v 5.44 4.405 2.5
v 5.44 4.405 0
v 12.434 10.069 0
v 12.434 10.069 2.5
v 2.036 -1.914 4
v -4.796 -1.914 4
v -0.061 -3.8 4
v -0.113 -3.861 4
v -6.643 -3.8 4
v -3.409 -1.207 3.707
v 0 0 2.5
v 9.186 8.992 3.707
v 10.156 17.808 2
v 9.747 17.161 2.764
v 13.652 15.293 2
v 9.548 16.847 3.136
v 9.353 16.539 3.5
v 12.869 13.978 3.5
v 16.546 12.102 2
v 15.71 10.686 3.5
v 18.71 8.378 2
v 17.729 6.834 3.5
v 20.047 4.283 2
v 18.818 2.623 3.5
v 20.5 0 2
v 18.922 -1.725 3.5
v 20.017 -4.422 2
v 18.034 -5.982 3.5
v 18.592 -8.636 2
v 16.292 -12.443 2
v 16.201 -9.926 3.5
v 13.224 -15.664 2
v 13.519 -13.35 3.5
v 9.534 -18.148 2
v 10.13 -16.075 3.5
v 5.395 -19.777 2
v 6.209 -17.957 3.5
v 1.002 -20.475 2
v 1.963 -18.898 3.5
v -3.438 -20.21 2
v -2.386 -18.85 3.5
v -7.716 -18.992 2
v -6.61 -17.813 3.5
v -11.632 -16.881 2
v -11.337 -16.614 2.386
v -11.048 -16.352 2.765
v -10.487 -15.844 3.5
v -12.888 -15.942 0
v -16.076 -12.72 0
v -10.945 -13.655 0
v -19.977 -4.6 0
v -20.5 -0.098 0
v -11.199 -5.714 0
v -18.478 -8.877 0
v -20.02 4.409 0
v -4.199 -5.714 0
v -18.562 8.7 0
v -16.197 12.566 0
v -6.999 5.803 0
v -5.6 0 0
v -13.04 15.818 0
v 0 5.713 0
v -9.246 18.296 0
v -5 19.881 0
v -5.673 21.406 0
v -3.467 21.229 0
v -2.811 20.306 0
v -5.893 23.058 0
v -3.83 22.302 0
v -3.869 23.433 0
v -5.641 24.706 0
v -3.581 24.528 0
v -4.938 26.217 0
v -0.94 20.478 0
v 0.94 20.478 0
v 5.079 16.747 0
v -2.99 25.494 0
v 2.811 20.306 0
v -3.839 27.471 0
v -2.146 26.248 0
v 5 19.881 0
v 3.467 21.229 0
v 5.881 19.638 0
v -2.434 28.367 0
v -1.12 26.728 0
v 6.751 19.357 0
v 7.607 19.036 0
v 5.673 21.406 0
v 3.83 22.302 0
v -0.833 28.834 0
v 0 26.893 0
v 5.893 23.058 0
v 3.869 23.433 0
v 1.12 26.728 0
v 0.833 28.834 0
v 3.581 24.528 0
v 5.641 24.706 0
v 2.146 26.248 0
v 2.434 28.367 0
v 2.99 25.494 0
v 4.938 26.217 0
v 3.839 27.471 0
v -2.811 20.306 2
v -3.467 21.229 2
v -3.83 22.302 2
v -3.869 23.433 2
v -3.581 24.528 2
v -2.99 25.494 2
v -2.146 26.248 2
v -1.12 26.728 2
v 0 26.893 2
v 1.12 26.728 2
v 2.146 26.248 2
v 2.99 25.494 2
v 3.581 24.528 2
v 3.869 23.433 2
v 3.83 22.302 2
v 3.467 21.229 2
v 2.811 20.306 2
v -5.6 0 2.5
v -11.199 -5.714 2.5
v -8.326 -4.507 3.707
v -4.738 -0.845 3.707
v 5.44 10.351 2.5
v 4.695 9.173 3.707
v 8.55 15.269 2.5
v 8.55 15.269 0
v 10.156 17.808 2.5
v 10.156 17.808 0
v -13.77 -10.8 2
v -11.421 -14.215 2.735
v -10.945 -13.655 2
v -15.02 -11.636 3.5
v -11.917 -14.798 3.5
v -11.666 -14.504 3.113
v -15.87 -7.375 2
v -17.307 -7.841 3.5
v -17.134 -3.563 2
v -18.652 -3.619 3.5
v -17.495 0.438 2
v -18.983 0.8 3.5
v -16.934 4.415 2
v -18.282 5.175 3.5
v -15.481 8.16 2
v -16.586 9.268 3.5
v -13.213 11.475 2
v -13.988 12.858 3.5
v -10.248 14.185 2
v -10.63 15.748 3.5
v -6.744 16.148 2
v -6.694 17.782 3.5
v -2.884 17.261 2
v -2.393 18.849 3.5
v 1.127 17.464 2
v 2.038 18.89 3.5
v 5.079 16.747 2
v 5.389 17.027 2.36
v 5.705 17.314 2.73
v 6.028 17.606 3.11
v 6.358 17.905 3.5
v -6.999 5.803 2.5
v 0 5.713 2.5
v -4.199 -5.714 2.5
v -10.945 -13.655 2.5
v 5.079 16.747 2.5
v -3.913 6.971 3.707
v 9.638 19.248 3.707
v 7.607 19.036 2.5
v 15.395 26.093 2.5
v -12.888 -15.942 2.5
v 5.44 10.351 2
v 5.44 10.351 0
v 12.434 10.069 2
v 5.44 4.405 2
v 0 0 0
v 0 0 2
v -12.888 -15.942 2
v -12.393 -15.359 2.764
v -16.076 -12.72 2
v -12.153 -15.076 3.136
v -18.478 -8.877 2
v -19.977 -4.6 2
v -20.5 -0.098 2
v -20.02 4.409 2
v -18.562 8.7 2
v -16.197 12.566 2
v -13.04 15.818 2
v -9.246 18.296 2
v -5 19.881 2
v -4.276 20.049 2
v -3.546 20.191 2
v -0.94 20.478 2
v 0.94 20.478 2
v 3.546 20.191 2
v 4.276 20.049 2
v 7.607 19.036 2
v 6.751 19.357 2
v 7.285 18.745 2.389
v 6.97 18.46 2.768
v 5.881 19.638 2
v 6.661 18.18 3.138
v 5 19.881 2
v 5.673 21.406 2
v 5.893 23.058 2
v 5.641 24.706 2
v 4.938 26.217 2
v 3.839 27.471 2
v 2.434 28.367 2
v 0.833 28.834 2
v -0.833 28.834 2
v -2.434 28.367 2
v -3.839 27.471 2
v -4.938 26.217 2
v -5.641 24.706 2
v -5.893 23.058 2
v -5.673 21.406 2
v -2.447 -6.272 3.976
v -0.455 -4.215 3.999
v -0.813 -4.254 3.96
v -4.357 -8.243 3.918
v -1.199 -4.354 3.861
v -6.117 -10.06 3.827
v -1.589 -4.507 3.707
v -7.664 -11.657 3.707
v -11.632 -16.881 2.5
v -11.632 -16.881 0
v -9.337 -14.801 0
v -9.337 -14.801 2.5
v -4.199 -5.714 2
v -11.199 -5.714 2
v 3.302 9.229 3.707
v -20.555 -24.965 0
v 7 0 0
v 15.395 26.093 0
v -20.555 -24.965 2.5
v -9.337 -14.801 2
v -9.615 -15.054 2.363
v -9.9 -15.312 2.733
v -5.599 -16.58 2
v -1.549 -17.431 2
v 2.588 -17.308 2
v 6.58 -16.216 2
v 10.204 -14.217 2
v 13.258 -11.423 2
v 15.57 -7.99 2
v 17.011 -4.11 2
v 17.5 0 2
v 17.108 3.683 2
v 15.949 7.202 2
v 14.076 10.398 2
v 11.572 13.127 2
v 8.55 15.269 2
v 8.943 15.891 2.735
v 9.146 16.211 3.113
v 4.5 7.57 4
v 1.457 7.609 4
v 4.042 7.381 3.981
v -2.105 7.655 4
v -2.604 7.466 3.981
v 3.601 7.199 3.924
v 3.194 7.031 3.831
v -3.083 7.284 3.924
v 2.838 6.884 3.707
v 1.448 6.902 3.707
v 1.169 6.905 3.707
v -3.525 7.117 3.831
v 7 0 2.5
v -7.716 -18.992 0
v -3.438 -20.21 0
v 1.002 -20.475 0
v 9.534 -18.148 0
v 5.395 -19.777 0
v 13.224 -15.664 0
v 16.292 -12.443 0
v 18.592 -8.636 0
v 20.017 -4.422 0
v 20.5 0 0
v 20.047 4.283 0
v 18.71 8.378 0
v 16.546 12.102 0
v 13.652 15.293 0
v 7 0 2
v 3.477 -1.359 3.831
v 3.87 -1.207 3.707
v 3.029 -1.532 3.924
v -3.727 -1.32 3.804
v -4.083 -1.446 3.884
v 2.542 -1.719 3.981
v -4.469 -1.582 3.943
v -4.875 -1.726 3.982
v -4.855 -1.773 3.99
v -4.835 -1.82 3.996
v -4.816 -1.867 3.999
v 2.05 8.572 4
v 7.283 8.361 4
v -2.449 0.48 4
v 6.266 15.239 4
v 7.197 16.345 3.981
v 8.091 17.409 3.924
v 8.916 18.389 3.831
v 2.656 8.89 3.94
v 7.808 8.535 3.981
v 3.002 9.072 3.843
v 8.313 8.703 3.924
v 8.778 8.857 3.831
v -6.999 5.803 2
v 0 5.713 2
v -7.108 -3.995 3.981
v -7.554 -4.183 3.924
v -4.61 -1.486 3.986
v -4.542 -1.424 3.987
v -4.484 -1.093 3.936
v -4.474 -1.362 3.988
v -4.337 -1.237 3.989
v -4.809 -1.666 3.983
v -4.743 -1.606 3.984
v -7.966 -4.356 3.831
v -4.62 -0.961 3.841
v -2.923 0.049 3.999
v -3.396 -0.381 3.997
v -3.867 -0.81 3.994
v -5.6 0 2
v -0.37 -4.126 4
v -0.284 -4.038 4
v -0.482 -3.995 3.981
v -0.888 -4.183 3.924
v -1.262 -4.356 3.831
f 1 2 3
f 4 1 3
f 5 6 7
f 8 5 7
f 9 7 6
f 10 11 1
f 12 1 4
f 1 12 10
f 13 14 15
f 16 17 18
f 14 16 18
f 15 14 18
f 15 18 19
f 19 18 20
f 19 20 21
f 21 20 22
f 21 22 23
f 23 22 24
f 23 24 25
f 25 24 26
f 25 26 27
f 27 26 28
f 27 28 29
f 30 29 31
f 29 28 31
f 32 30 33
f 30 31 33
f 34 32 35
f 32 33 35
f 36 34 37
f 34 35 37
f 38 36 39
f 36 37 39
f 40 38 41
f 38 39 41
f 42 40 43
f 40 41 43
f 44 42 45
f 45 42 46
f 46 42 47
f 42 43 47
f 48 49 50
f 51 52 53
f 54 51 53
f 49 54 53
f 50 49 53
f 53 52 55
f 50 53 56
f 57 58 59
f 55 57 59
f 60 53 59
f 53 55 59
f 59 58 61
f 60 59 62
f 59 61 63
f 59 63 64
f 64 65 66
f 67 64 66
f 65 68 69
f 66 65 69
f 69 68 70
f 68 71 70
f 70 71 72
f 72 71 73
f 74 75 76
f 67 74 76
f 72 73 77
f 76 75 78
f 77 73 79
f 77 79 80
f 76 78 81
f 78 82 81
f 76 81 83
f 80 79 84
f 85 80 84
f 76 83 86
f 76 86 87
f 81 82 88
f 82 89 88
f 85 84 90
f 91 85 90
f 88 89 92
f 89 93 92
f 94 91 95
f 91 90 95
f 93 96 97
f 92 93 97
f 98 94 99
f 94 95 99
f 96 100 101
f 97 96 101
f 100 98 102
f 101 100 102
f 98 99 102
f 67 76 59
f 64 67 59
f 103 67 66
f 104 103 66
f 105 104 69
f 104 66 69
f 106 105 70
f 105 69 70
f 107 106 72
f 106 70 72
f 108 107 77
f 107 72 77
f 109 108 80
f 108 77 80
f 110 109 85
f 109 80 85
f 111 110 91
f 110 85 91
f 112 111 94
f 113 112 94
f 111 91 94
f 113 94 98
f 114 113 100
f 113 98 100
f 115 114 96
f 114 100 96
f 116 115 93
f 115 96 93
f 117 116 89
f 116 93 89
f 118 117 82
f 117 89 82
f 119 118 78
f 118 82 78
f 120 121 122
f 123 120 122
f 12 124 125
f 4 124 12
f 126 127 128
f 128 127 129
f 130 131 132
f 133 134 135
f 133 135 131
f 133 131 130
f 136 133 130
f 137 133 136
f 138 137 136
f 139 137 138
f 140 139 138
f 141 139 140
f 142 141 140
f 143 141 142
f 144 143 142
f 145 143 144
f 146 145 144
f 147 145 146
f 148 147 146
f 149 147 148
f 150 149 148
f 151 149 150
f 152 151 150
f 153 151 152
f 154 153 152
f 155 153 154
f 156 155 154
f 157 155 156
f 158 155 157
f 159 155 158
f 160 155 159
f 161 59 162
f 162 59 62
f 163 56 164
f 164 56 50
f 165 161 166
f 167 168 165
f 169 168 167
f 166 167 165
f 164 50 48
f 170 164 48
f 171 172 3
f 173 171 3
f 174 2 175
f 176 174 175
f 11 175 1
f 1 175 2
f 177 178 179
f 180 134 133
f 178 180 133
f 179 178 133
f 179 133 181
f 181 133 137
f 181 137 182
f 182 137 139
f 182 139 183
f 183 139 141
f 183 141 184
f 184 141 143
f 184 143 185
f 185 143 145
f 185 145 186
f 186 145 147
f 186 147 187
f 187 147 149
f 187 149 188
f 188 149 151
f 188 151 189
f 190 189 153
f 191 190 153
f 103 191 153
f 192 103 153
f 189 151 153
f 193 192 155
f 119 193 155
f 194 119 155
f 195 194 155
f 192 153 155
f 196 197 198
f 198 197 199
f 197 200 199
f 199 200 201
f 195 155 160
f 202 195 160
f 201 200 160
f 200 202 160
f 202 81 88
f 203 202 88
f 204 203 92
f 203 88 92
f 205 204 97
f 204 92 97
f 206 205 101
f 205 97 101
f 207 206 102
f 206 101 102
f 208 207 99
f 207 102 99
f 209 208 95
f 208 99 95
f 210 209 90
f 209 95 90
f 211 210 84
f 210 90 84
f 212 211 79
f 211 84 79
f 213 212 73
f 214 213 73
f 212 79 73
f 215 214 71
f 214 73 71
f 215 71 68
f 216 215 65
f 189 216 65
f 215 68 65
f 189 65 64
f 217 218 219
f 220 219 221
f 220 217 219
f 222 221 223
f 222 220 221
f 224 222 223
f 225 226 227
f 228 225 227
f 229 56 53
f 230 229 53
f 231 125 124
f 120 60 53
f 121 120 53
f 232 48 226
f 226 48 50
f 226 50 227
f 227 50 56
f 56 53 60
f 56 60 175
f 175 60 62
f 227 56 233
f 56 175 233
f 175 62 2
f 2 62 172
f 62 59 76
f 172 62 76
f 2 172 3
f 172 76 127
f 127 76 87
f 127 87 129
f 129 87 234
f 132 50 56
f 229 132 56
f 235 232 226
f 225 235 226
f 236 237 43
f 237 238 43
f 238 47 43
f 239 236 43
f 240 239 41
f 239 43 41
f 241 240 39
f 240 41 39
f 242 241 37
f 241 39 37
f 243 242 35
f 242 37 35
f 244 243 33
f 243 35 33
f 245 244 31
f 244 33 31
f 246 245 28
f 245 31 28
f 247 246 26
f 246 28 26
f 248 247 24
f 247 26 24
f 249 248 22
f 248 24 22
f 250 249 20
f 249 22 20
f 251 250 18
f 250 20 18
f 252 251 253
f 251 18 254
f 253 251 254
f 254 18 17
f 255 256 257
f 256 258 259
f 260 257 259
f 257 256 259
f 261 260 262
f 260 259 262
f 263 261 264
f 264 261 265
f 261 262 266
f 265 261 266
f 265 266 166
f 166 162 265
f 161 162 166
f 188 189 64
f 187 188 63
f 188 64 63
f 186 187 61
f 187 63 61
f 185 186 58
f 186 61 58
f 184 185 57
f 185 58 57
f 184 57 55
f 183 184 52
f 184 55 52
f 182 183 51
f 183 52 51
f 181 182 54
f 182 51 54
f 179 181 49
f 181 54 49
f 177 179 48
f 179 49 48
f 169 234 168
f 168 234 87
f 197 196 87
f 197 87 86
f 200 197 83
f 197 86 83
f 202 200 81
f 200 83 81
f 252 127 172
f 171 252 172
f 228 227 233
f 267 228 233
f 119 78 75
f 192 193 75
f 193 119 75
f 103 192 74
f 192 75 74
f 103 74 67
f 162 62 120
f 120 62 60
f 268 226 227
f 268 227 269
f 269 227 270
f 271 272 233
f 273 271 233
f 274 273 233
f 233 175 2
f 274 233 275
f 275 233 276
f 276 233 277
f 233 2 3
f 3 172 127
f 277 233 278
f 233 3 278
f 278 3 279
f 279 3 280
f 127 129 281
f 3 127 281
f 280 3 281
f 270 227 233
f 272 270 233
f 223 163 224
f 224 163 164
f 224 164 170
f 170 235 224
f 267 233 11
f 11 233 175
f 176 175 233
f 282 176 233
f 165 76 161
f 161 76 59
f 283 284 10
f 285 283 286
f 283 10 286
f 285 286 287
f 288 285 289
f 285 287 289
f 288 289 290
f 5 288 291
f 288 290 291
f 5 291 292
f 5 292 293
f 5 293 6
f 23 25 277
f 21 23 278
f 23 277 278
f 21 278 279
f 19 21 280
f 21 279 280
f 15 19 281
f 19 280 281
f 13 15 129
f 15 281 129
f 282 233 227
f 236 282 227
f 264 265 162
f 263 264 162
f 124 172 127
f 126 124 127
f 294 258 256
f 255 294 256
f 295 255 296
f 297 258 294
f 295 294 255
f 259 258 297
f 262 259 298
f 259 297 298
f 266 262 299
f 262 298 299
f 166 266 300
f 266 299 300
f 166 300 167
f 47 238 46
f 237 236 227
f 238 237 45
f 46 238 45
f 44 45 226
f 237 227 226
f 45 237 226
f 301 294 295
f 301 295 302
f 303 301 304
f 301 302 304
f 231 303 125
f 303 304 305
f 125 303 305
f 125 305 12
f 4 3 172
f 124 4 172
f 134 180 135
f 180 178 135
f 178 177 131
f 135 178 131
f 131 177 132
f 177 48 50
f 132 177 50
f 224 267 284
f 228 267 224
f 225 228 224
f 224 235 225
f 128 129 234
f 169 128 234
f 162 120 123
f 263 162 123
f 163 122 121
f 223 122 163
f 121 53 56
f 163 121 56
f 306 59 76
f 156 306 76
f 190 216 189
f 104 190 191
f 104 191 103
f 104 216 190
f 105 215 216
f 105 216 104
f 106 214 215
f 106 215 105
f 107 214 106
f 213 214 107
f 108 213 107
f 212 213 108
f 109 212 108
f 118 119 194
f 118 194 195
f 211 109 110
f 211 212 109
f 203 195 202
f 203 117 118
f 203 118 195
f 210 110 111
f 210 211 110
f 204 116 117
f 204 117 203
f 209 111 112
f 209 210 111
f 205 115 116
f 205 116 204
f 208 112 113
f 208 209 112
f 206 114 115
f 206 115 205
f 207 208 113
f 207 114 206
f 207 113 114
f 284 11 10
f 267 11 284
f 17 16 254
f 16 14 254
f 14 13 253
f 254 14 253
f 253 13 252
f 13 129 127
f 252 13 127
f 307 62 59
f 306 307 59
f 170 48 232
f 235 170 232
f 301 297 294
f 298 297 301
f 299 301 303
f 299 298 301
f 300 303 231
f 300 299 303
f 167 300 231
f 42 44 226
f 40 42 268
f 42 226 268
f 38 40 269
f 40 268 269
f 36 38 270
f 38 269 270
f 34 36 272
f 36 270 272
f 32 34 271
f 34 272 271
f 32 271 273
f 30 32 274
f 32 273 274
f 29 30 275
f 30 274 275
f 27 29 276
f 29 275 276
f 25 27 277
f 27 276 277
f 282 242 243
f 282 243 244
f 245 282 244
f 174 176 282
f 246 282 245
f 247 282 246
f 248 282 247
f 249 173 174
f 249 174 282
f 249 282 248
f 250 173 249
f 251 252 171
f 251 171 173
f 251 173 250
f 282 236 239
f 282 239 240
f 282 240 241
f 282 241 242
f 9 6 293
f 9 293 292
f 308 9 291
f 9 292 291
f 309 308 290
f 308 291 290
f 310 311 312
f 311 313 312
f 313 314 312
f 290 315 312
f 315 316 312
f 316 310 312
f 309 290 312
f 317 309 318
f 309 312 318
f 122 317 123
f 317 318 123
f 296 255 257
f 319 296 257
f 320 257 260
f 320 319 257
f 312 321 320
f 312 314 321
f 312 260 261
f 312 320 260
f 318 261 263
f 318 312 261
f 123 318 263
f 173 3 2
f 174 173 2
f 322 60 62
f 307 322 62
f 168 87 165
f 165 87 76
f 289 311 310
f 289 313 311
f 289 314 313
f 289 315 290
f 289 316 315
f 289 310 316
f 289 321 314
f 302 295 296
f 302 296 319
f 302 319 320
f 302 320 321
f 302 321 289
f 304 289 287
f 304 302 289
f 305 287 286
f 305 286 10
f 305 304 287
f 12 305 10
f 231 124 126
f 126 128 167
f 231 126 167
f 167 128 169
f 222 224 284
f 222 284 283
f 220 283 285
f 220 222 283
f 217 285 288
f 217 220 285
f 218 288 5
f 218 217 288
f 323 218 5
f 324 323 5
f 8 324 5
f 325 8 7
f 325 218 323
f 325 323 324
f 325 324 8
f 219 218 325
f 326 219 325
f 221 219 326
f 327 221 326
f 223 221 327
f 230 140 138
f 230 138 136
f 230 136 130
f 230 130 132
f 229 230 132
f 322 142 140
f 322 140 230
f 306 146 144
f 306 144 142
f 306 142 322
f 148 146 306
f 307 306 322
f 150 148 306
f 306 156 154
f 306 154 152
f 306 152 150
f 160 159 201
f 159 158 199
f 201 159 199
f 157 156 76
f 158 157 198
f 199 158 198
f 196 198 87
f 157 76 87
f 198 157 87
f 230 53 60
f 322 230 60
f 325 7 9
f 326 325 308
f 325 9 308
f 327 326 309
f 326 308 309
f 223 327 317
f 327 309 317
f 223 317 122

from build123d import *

# Parameters (mm, degrees)
F1_DEPTH      = 4
F2_DEPTH      = 2
F3_DEPTH      = 4
F4_T4_ANGLE   = 191.8794829406
F4_T7_ANGLE   = 191.6152635237
F4_2_T4_ANGLE = 216.7313007881
F4_2_T7_ANGLE = 213.6722162464
F5_T1_DEPTH   = 44.8975853427
F5_T6_DEPTH   = 12.4810064107
F5_T11_DEPTH  = 26.0985725575
F5_T16_DEPTH  = 12.442760274
F5_T21_DEPTH  = 28.0729631379
F5_T23_DEPTH  = 35.0265854945
F5_T28_DEPTH  = 12.5120201061
F5_T30_DEPTH  = 11.8575244819
F5_T35_DEPTH  = 13.9320278094
F5_T40_DEPTH  = 12.6150489639
F5_T45_DEPTH  = 38.8381685856
F6_T1_DEPTH   = 19.5328240955
F6_T3_DEPTH   = 5.6520455224
F6_T5_DEPTH   = 16.5312582393
F6_T7_DEPTH   = 5.740258782
F6_T9_DEPTH   = 5.4658400603
F6_T14_DEPTH  = 14.3536282373
F6_T19_DEPTH  = 7.6900173534
F6_T24_DEPTH  = 3.1100372333
F6_T29_DEPTH  = 12.5427572364
F6_T34_DEPTH  = 18.3278104704
F6_T39_DEPTH  = 9.4173142872
F6_T44_DEPTH  = 3.0038182041
F6_T49_DEPTH  = 11.742181059
F6_T55_DEPTH  = 14.3536282373
F6_T59_DEPTH  = 7.6900173534
F6_T66_DEPTH  = 12.5427572364
F6_T70_DEPTH  = 3.1100372333
F6_T77_DEPTH  = 9.4173142872
F6_T81_DEPTH  = 18.3278104704
F6_T88_DEPTH  = 11.742181059
F6_T92_DEPTH  = 3.0038182041
F7_DEPTH      = 2


# Not quite as in the source:
# - a fillet or chamfer that OpenCascade refuses, or shapes differently, is made with other operations: its cross-section is extruded or revolved along the edge and cut away or added


with BuildPart() as f1:
    # F0 (on Top) → F1 (new body)
    with BuildSketch(Plane.XY):
        with BuildLine():
            ThreePointArc((7.6067055324, 19.0364920861), (6.317476578, 19.5022944723), (5, 19.8808953521))
            ThreePointArc((5, 19.8808953521), (3.9112066982, 20.1234306758), (2.8108329276, 20.3063836823))
            ThreePointArc((2.8108329276, 20.3063836823), (0, 20.5), (-2.8108329276, 20.3063836823))
            ThreePointArc((-2.8108329276, 20.3063836823), (-3.9112066982, 20.1234306758), (-5, 19.8808953521))
            ThreePointArc((-5, 19.8808953521), (-20.0203567241, 4.4085504011), (-12.8882864218, -15.9418340573))
            Line((-12.8882864218, -15.9418340573), (-10.945178398, -13.6547819402))
            ThreePointArc((-10.945178398, -13.6547819402), (-15.4810745708, 8.1600447385), (5.0793558765, 16.7466457501))
            Line((5.0793558765, 16.7466457501), (7.6067055324, 19.0364920861))
        make_face()
    extrude(amount=F1_DEPTH)

    # F0 (on Top) → F2 (join)
    with BuildSketch(Plane.XY):
        with BuildLine():
            Line((-6.9994239003, 5.8029484458), (5.0793558765, 16.7466457501))
            ThreePointArc((5.0793558765, 16.7466457501), (-15.4810745708, 8.1600447385), (-10.945178398, -13.6547819402))
            Line((-10.945178398, -13.6547819402), (-4.1988336978, -5.7142857143))
            Line((-4.1988336978, -5.7142857143), (-11.1988336978, -5.7142857143))
            Line((-11.1988336978, -5.7142857143), (-5.6, 0))
            Line((-5.6, 0), (0, 5.7131427428))
            Line((0, 5.7131427428), (-6.9994239003, 5.8029484458))
        make_face()
    extrude(amount=F2_DEPTH)

    # F4: chamfer of 2 on 2 edges, made by hand


with BuildPart() as f1b:
    # F0 (on Top) → F1, piece 2 (new body)
    with BuildSketch(Plane.XY):
        with BuildLine():
            ThreePointArc((20.5, 0), (17.7262389076, 10.297109021), (10.1555654448, 17.807708738))
            Line((10.1555654448, 17.807708738), (8.5501270855, 15.2690971188))
            ThreePointArc((8.5501270855, 15.2690971188), (15.0976359738, 8.8493721812), (17.5, 0))
            ThreePointArc((17.5, 0), (8.4516512974, -15.3238242729), (-9.336524611, -14.8013279197))
            Line((-9.336524611, -14.8013279197), (-11.6315427767, -16.8806757162))
            ThreePointArc((-11.6315427767, -16.8806757162), (9.5342375961, -18.1479561786), (20.5, 0))
        make_face()
    extrude(amount=F1_DEPTH)

    # F0 (on Top) → F2, piece 2 (join)
    with BuildSketch(Plane.XY):
        with BuildLine():
            ThreePointArc((17.5, 0), (15.0976359738, 8.8493721812), (8.5501270855, 15.2690971188))
            Line((8.5501270855, 15.2690971188), (5.4400217302, 10.3512193653))
            Line((5.4400217302, 10.3512193653), (12.4343353833, 10.0691262568))
            Line((12.4343353833, 10.0691262568), (5.4400217302, 4.4052427373))
            Line((5.4400217302, 4.4052427373), (0, 0))
            Line((0, 0), (7, 0))
            Line((7, 0), (-9.336524611, -14.8013279197))
            ThreePointArc((-9.336524611, -14.8013279197), (8.4516512974, -15.3238242729), (17.5, 0))
        make_face()
    extrude(amount=F2_DEPTH)

    # F4#2: chamfer of 2 on 2 edges, made by hand


with BuildPart() as f3:
    # F0 (on Top) → F3 (new body)
    with BuildSketch(Plane.XY):
        with BuildLine():
            ThreePointArc((-11.6315427767, -16.8806757162), (-12.2688981533, -16.4232803698), (-12.8882864218, -15.9418340573))
            Line((-12.8882864218, -15.9418340573), (-20.5548353552, -24.9654172829))
            Line((-20.5548353552, -24.9654172829), (-11.6315427767, -16.8806757162))
        make_face()
        with BuildLine():
            Line((-10.945178398, -13.6547819402), (-12.8882864218, -15.9418340573))
            ThreePointArc((-12.8882864218, -15.9418340573), (-12.2688981533, -16.4232803698), (-11.6315427767, -16.8806757162))
            Line((-11.6315427767, -16.8806757162), (-9.336524611, -14.8013279197))
            ThreePointArc((-9.336524611, -14.8013279197), (-10.1570424415, -14.2507715174), (-10.945178398, -13.6547819402))
        make_face()
        with BuildLine():
            ThreePointArc((8.5501270855, 15.2690971188), (6.8546691344, 16.1016617483), (5.0793558765, 16.7466457501))
            Line((5.0793558765, 16.7466457501), (-6.9994239003, 5.8029484458))
            Line((-6.9994239003, 5.8029484458), (0, 5.7131427428))
            Line((0, 5.7131427428), (-5.6, 0))
            Line((-5.6, 0), (-11.1988336978, -5.7142857143))
            Line((-11.1988336978, -5.7142857143), (-4.1988336978, -5.7142857143))
            Line((-4.1988336978, -5.7142857143), (-10.945178398, -13.6547819402))
            ThreePointArc((-10.945178398, -13.6547819402), (-10.1570424415, -14.2507715174), (-9.336524611, -14.8013279197))
            Line((-9.336524611, -14.8013279197), (7, 0))
            Line((7, 0), (0, 0))
            Line((0, 0), (5.4400217302, 4.4052427373))
            Line((5.4400217302, 4.4052427373), (12.4343353833, 10.0691262568))
            Line((12.4343353833, 10.0691262568), (5.4400217302, 10.3512193653))
            Line((5.4400217302, 10.3512193653), (8.5501270855, 15.2690971188))
        make_face()
        with BuildLine():
            ThreePointArc((10.1555654448, 17.807708738), (8.9023617482, 18.4661299493), (7.6067055324, 19.0364920861))
            Line((7.6067055324, 19.0364920861), (5.0793558765, 16.7466457501))
            ThreePointArc((5.0793558765, 16.7466457501), (6.8546691344, 16.1016617483), (8.5501270855, 15.2690971188))
            Line((8.5501270855, 15.2690971188), (10.1555654448, 17.807708738))
        make_face()
        with BuildLine():
            Line((15.3954302851, 26.0932848794), (7.6067055324, 19.0364920861))
            ThreePointArc((7.6067055324, 19.0364920861), (8.9023617482, 18.4661299493), (10.1555654448, 17.807708738))
            Line((10.1555654448, 17.807708738), (15.3954302851, 26.0932848794))
        make_face()
    extrude(amount=F3_DEPTH)

    # F5: chamfer of 1.5 on 11 edges, made by hand

    # F5_s2 → F5_t1 (cut)
    with BuildSketch(Plane(origin=(-26.5692425202, -24.0724438327, 0), x_dir=(0, 0, 1), z_dir=(0.7410692771, 0.6714285714, 0))):
        Polygon((2.5, 4.7), (4, 3.2), (4, 4.7), align=None)
    extrude(amount=F5_T1_DEPTH, mode=Mode.SUBTRACT)


with BuildPart() as f4_tool2:
    # F4_s3 → F4_t4 (revolve)
    with BuildSketch(Plane(origin=(0, 0, 0), x_dir=(0, 0, 1), z_dir=(0.9281361418, -0.3722409198, 0))):
        Polygon((2, 17.5), (4, 19.5), (4, 17.5), align=None)
    revolve(axis=Axis((0, 0, 4), (0, 0, -1)), revolution_arc=F4_T4_ANGLE)

    split(bisect_by=Plane.XY.offset(2), keep=Keep.TOP)


with BuildPart() as f1_1:
    add(f1.part)

    # F4_t1: cut F4_tool2
    add(f4_tool2.part, mode=Mode.SUBTRACT)

    # F4_s6 → F4_t7 (revolve, cut)
    with BuildSketch(Plane(origin=(0, 0, 0), x_dir=(0, 0, 1), z_dir=(0.9095275389, -0.4156436646, 0))):
        Polygon((2, 20.5), (4, 18.5), (4, 20.5), align=None)
    revolve(axis=Axis((0, 0, 4), (0, 0, -1)), revolution_arc=F4_T7_ANGLE, mode=Mode.SUBTRACT)

    # F0 (on Top) → F7 (join)
    with BuildSketch(Plane.XY):
        with BuildLine():
            ThreePointArc((2.8108329276, 20.3063836823), (3.9112066982, 20.1234306758), (5, 19.8808953521))
            ThreePointArc((5, 19.8808953521), (0, 28.8931157977), (-5, 19.8808953521))
            ThreePointArc((-5, 19.8808953521), (-3.9112066982, 20.1234306758), (-2.8108329276, 20.3063836823))
            ThreePointArc((-2.8108329276, 20.3063836823), (0, 26.8931157977), (2.8108329276, 20.3063836823))
        make_face()
    extrude(amount=F7_DEPTH)


with BuildPart() as f4_2_tool2:
    # F4_2_s3 → F4_2_t4 (revolve)
    with BuildSketch(Plane(origin=(0, 0, 0), x_dir=(0, 0, 1), z_dir=(-0.6545969301, 0.7559780811, 0))):
        Polygon((2, -17.5), (4, -19.5), (4, -17.5), align=None)
    revolve(axis=Axis((0, 0, 4), (0, 0, 1)), revolution_arc=F4_2_T4_ANGLE)

    split(bisect_by=Plane.XY.offset(2), keep=Keep.TOP)


with BuildPart() as f1b_1:
    add(f1b.part)

    # F4_2_t1: cut F4_2_tool2
    add(f4_2_tool2.part, mode=Mode.SUBTRACT)

    # F4_2_s6 → F4_2_t7 (revolve, cut)
    with BuildSketch(Plane(origin=(0, 0, 0), x_dir=(0, 0, 1), z_dir=(-0.964575687, 0.2638062623, 0))):
        Polygon((2, 20.5), (4, 18.5), (4, 20.5), align=None)
    revolve(axis=Axis((0, 0, 4), (0, 0, -1)), revolution_arc=F4_2_T7_ANGLE, mode=Mode.SUBTRACT)


with BuildPart() as f5_tool4:
    # F5_s5 → F5_t6 (new body)
    with BuildSketch(Plane.YZ.offset(8.6234819288)):
        Polygon((0, 2.5), (-1.5, 4), (0, 4), align=None)
    extrude(amount=-F5_T6_DEPTH)

    split(bisect_by=Plane(origin=(0, 0, 0), x_dir=(0, 0, 1), z_dir=(0.629320391, -0.7771459615, 0)), keep=Keep.TOP)


with BuildPart() as f3_1:
    add(f3.part)

    # F5_t3: cut F5_tool4
    add(f5_tool4.part, mode=Mode.SUBTRACT)


with BuildPart() as f5_tool9:
    # F5_s10 → F5_t11 (new body)
    with BuildSketch(Plane(origin=(15.4321949557, 12.4967450723, 0), x_dir=(0, 0, 1), z_dir=(-0.7771459615, -0.629320391, 0))):
        Polygon((2.5, 0), (4, 1.5), (4, 0), align=None)
    extrude(amount=F5_T11_DEPTH)

    split(bisect_by=Plane(origin=(0, 1.25, 1.25), x_dir=(1, 0, 0), z_dir=(0, 0.7071067812, 0.7071067812)), keep=Keep.TOP)


with BuildPart() as f3_2:
    add(f3_1.part)

    # F5_t8: cut F5_tool9
    add(f5_tool9.part, mode=Mode.SUBTRACT)


with BuildPart() as f5_tool14:
    # F5_s15 → F5_t16 (new body)
    with BuildSketch(Plane(origin=(13.5926436903, -0.5482154936, 0), x_dir=(0, 0, 1), z_dir=(-0.9991876647, 0.0402990155, 0))):
        Polygon((2.5, 10.5620382248), (4, 9.0620382248), (4, 10.5620382248), align=None)
    extrude(amount=F5_T16_DEPTH)

    split(bisect_by=Plane(origin=(-0.7901571012, 0.4997016915, 0), x_dir=(0, 0, 1), z_dir=(0.8451723931, -0.5344938035, 0)), keep=Keep.TOP)


with BuildPart() as f3_3:
    add(f3_2.part)

    # F5_t13: cut F5_tool14
    add(f5_tool14.part, mode=Mode.SUBTRACT)


with BuildPart() as f5_tool19:
    # F5_s20 → F5_t21 (new body)
    with BuildSketch(Plane(origin=(18.247410319, 28.8538563855, 0), x_dir=(0, 0, 1), z_dir=(-0.5344938035, -0.8451723931, 0))):
        Polygon((2.5, 0.9349064259), (4, 2.4349064259), (4, 0.9349064259), align=None)
    extrude(amount=F5_T21_DEPTH)

    split(bisect_by=Plane(origin=(0.2631936405, 6.5257137352, 6.5310191124), x_dir=(-0.9991876647, 0.0402990155, 0), z_dir=(0.0284957071, 0.7065323734, 0.7071067812)), keep=Keep.TOP)


with BuildPart() as f3_4:
    add(f3_3.part)

    # F5_t18: cut F5_tool19
    add(f5_tool19.part, mode=Mode.SUBTRACT)

    # F5_s24 → F5_t23 (cut)
    with BuildSketch(Plane(origin=(22.1418667552, 20.0611230603, 0), x_dir=(0, 0, 1), z_dir=(-0.7410692771, -0.6714285714, 0))):
        Polygon((2.5, 9), (4, 7.5), (4, 9), align=None)
    extrude(amount=F5_T23_DEPTH, mode=Mode.SUBTRACT)


with BuildPart() as f5_tool26:
    # F5_s27 → F5_t28 (new body)
    with BuildSketch(Plane(origin=(-8.7270734415, 0.1119722104, 0), x_dir=(0, 0, 1), z_dir=(0.9999177, -0.0128293861, 0))):
        Polygon((2.5, -5.7126725514), (4, -7.2126725514), (4, -5.7126725514), align=None)
    extrude(amount=F5_T28_DEPTH)

    split(bisect_by=Plane(origin=(-2.856, 2.799439944, 0), x_dir=(0, 0, 1), z_dir=(-0.7141428429, 0.7, 0)), keep=Keep.TOP)


with BuildPart() as f3_5:
    add(f3_4.part)

    # F5_t25: cut F5_tool26
    add(f5_tool26.part, mode=Mode.SUBTRACT)

    # F5_s31 → F5_t30 (cut)
    with BuildSketch(Plane(origin=(-2.7428571429, -2.7994168489, 0), x_dir=(0, 0, 1), z_dir=(-0.6998542122, -0.7142857143, 0))):
        Polygon((2.5, 4), (4, 2.5), (4, 4), align=None)
    extrude(amount=F5_T30_DEPTH, mode=Mode.SUBTRACT)


with BuildPart() as f5_tool33:
    # F5_s34 → F5_t35 (new body)
    with BuildSketch(Plane(origin=(-2.744, -2.799439944, 0), x_dir=(0, 0, 1), z_dir=(0.7, 0.7141428429, 0))):
        Polygon((2.5, -3.99919992), (4, -2.49919992), (4, -3.99919992), align=None)
    extrude(amount=F5_T35_DEPTH)

    split(bisect_by=Plane(origin=(0.0206083084, 1.6062040743, -1.6063362757), x_dir=(0.9999177, -0.0128293861, 0), z_dir=(-0.0090717459, -0.7070485863, 0.7071067812)), keep=Keep.TOP)


with BuildPart() as f3_6:
    add(f3_5.part)

    # F5_t32: cut F5_tool33
    add(f5_tool33.part, mode=Mode.SUBTRACT)


with BuildPart() as f5_tool38:
    # F5_s39 → F5_t40 (new body)
    with BuildSketch(Plane.YZ.offset(-12.9563581797)):
        Polygon((-5.7142857143, 2.5), (-4.2142857143, 4), (-5.7142857143, 4), align=None)
    extrude(amount=F5_T40_DEPTH)

    split(bisect_by=Plane(origin=(0.3810425154, -0.3237384769, 0), x_dir=(0, 0, 1), z_dir=(-0.7620850308, 0.6474769539, 0)), keep=Keep.TOP)


with BuildPart() as f3_7:
    add(f3_6.part)

    # F5_t37: cut F5_tool38
    add(f5_tool38.part, mode=Mode.SUBTRACT)


with BuildPart() as f5_tool43:
    # F5_s44 → F5_t45 (new body)
    with BuildSketch(Plane(origin=(-25.9546183807, -30.5487724767, 0), x_dir=(0, 0, 1), z_dir=(0.6474769539, 0.7620850308, 0))):
        Polygon((2.5, 0.5), (4, 2), (4, 0.5), align=None)
    extrude(amount=F5_T45_DEPTH)

    split(bisect_by=Plane(origin=(0, -4.1071428571, 4.1071428571), x_dir=(1, 0, 0), z_dir=(0, -0.7071067812, 0.7071067812)), keep=Keep.TOP)


with BuildPart() as f3_8:
    add(f3_7.part)

    # F5_t42: cut F5_tool43
    add(f5_tool43.part, mode=Mode.SUBTRACT)

    # F6: fillet of radius 1 on 13 edges, made by hand

    # F6_s2 → F6_t1 (cut)
    with BuildSketch(Plane(origin=(15.5795084063, 14.1154510057, 0), x_dir=(0, 0, 1), z_dir=(-0.7410692771, -0.6714285714, 0))):
        with BuildLine():
            ThreePointArc((4, 7.0857864376), (3.9238795325, 7.46846987), (3.7071067812, 7.7928932188))
            Line((3.7071067812, 7.7928932188), (4, 7.5))
            Line((4, 7.5), (4, 7.0857864376))
        make_face()
    extrude(amount=F6_T1_DEPTH, mode=Mode.SUBTRACT)

    # F6_s4 → F6_t3 (cut)
    with BuildSketch(Plane(origin=(-4.2919621914, 0.0550677723, 0), x_dir=(0, 0, 1), z_dir=(0.9999177, -0.0128293861, 0))):
        with BuildLine():
            ThreePointArc((4, -7.6268861138), (3.9238795325, -7.2442026814), (3.7071067812, -6.9197793326))
            Line((3.7071067812, -6.9197793326), (4, -7.2126725514))
            Line((4, -7.2126725514), (4, -7.6268861138))
        make_face()
    extrude(amount=F6_T3_DEPTH, mode=Mode.SUBTRACT)

    # F6_s6 → F6_t5 (cut)
    with BuildSketch(Plane(origin=(-10.5215995116, -9.5328503656, 0), x_dir=(0, 0, 1), z_dir=(0.7410692771, 0.6714285714, 0))):
        with BuildLine():
            ThreePointArc((3.7071067812, 3.4928932188), (3.9238795325, 3.16846987), (4, 2.7857864376))
            Line((4, 2.7857864376), (4, 3.2))
            Line((4, 3.2), (3.7071067812, 3.4928932188))
        make_face()
    extrude(amount=F6_T5_DEPTH, mode=Mode.SUBTRACT)

    # F6_s8 → F6_t7 (cut)
    with BuildSketch(Plane.YZ.offset(-8.6646737581)):
        with BuildLine():
            ThreePointArc((-3.8000721519, 4), (-4.1827555843, 3.9238795325), (-4.5071789331, 3.7071067812))
            Line((-4.5071789331, 3.7071067812), (-4.2142857143, 4))
            Line((-4.2142857143, 4), (-3.8000721519, 4))
        make_face()
    extrude(amount=F6_T7_DEPTH, mode=Mode.SUBTRACT)

    # F6_s10 → F6_t9 (cut)
    with BuildSketch(Plane(origin=(-2.7428571429, -2.7994168489, 0), x_dir=(0, 0, 1), z_dir=(-0.6998542122, -0.7142857143, 0))):
        with BuildLine():
            ThreePointArc((4, 2.0857864376), (3.9238795325, 2.46846987), (3.7071067812, 2.7928932188))
            Line((3.7071067812, 2.7928932188), (4, 2.5))
            Line((4, 2.5), (4, 2.0857864376))
        make_face()
    extrude(amount=F6_T9_DEPTH, mode=Mode.SUBTRACT)


with BuildPart() as f6_tool12:
    # F6_s13 → F6_t14 (new body)
    with BuildSketch(Plane(origin=(11.9599620904, 18.9117810419, 0), x_dir=(0, 0, 1), z_dir=(-0.5344938035, -0.8451723931, 0))):
        with BuildLine():
            ThreePointArc((4, 2.8491199883), (3.9238795325, 2.4664365559), (3.7071067812, 2.1420132071))
            Line((3.7071067812, 2.1420132071), (4, 2.4349064259))
            Line((4, 2.4349064259), (4, 2.8491199883))
        make_face()
    extrude(amount=F6_T14_DEPTH)

    split(bisect_by=Plane(origin=(0.2631936405, 6.5257137352, 6.5310191124), x_dir=(-0.9991876647, 0.0402990155, 0), z_dir=(0.0284957071, 0.7065323734, 0.7071067812)), keep=Keep.TOP)


with BuildPart() as f3_9:
    add(f3_8.part)

    # F6_t11: cut F6_tool12
    add(f6_tool12.part, mode=Mode.SUBTRACT)


with BuildPart() as f6_tool17:
    # F6_s18 → F6_t19 (new body)
    with BuildSketch(Plane(origin=(9.0674940614, -0.3657081614, 0), x_dir=(0, 0, 1), z_dir=(-0.9991876647, 0.0402990155, 0))):
        with BuildLine():
            ThreePointArc((4, 8.6478246624), (3.9238795325, 9.0305080948), (3.7071067812, 9.3549314436))
            Line((3.7071067812, 9.3549314436), (4, 9.0620382248))
            Line((4, 9.0620382248), (4, 8.6478246624))
        make_face()
    extrude(amount=F6_T19_DEPTH)

    split(bisect_by=Plane(origin=(0.6613869407, -0.4182664087, 0.7825467871), x_dir=(0.5344938035, 0.8451723931, 0), z_dir=(0.5976271304, -0.377944193, 0.7071067812)), keep=Keep.TOP)


with BuildPart() as f3_10:
    add(f3_9.part)

    # F6_t16: cut F6_tool17
    add(f6_tool17.part, mode=Mode.SUBTRACT)


with BuildPart() as f6_tool22:
    # F6_s23 → F6_t24 (new body)
    with BuildSketch(Plane(origin=(1.3596181679, -0.0174445022, 0), x_dir=(0, 0, 1), z_dir=(0.9999177, -0.0128293861, 0))):
        with BuildLine():
            ThreePointArc((4, -7.6268861138), (3.9238795325, -7.2442026814), (3.7071067812, -6.9197793326))
            Line((3.7071067812, -6.9197793326), (4, -7.2126725514))
            Line((4, -7.2126725514), (4, -7.6268861138))
        make_face()
    extrude(amount=F6_T24_DEPTH)

    split(bisect_by=Plane(origin=(-2.3206785536, 2.274719972, 3.24959996), x_dir=(-0.7, -0.7141428429, 0), z_dir=(-0.5049752469, 0.4949747468, 0.7071067812)), keep=Keep.TOP)


with BuildPart() as f3_11:
    add(f3_10.part)

    # F6_t21: cut F6_tool22
    add(f6_tool22.part, mode=Mode.SUBTRACT)


with BuildPart() as f6_tool27:
    # F6_s28 → F6_t29 (new body)
    with BuildSketch(Plane(origin=(-2.7437856705, -2.7992212842, 0), x_dir=(0, 0, 1), z_dir=(0.7, 0.7141428429, 0))):
        with BuildLine():
            ThreePointArc((4, -2.0849863576), (3.9238795325, -2.46766979), (3.7071067812, -2.7920931388))
            Line((3.7071067812, -2.7920931388), (4, -2.49919992))
            Line((4, -2.49919992), (4, -2.0849863576))
        make_face()
    extrude(amount=F6_T29_DEPTH)

    split(bisect_by=Plane(origin=(0.0206083084, 1.6062040743, -1.6063362757), x_dir=(0.9999177, -0.0128293861, 0), z_dir=(-0.0090717459, -0.7070485863, 0.7071067812)), keep=Keep.TOP)


with BuildPart() as f3_12:
    add(f3_11.part)

    # F6_t26: cut F6_tool27
    add(f6_tool27.part, mode=Mode.SUBTRACT)


with BuildPart() as f6_tool32:
    # F6_s33 → F6_t34 (new body)
    with BuildSketch(Plane(origin=(10.1467341546, 8.2166633075, 0), x_dir=(0, 0, 1), z_dir=(-0.7771459615, -0.629320391, 0))):
        with BuildLine():
            ThreePointArc((4, 1.9142135624), (3.9238795325, 1.53153013), (3.7071067812, 1.2071067812))
            Line((3.7071067812, 1.2071067812), (4, 1.5))
            Line((4, 1.5), (4, 1.9142135624))
        make_face()
    extrude(amount=F6_T34_DEPTH)

    split(bisect_by=Plane(origin=(0, 1.25, 1.25), x_dir=(1, 0, 0), z_dir=(0, 0.7071067812, 0.7071067812)), keep=Keep.TOP)


with BuildPart() as f3_13:
    add(f3_12.part)

    # F6_t31: cut F6_tool32
    add(f6_tool32.part, mode=Mode.SUBTRACT)


with BuildPart() as f6_tool37:
    # F6_s38 → F6_t39 (new body)
    with BuildSketch(Plane.YZ.offset(-5.2714032343)):
        with BuildLine():
            ThreePointArc((-1.2071067812, 3.7071067812), (-1.53153013, 3.9238795325), (-1.9142135624, 4))
            Line((-1.9142135624, 4), (-1.5, 4))
            Line((-1.5, 4), (-1.2071067812, 3.7071067812))
        make_face()
    extrude(amount=F6_T39_DEPTH)

    split(bisect_by=Plane(origin=(0.7866504888, -0.9714324518, 1.25), x_dir=(0.7771459615, 0.629320391, 0), z_dir=(0.4449967161, -0.5495251793, 0.7071067812)), keep=Keep.TOP)


with BuildPart() as f3_14:
    add(f3_13.part)

    # F6_t36: cut F6_tool37
    add(f6_tool37.part, mode=Mode.SUBTRACT)


with BuildPart() as f6_tool42:
    # F6_s43 → F6_t44 (new body)
    with BuildSketch(Plane.YZ.offset(-2.924414976)):
        with BuildLine():
            ThreePointArc((-3.8000721519, 4), (-4.1827555843, 3.9238795325), (-4.5071789331, 3.7071067812))
            Line((-4.5071789331, 3.7071067812), (-4.2142857143, 4))
            Line((-4.2142857143, 4), (-3.8000721519, 4))
        make_face()
    extrude(amount=F6_T44_DEPTH)

    split(bisect_by=Plane(origin=(-0.7620850308, 0.6474769539, 1), x_dir=(-0.6474769539, -0.7620850308, 0), z_dir=(-0.5388754931, 0.4578353448, 0.7071067812)), keep=Keep.TOP)


with BuildPart() as f3_15:
    add(f3_14.part)

    # F6_t41: cut F6_tool42
    add(f6_tool42.part, mode=Mode.SUBTRACT)


with BuildPart() as f6_tool47:
    # F6_s48 → F6_t49 (new body)
    with BuildSketch(Plane(origin=(-9.4126080245, -11.078707332, 0), x_dir=(0, 0, 1), z_dir=(0.6474769539, 0.7620850308, 0))):
        with BuildLine():
            ThreePointArc((4, 2.4142135624), (3.9238795325, 2.03153013), (3.7071067812, 1.7071067812))
            Line((3.7071067812, 1.7071067812), (4, 2))
            Line((4, 2), (4, 2.4142135624))
        make_face()
    extrude(amount=F6_T49_DEPTH)

    split(bisect_by=Plane(origin=(0, -4.1071428571, 4.1071428571), x_dir=(1, 0, 0), z_dir=(0, -0.7071067812, 0.7071067812)), keep=Keep.TOP)


with BuildPart() as f3_16:
    add(f3_15.part)

    # F6_t46: cut F6_tool47
    add(f6_tool47.part, mode=Mode.SUBTRACT)


with BuildPart() as f6_tool53:
    # F6_s54 → F6_t55 (new body)
    with BuildSketch(Plane(origin=(11.9599620904, 18.9117810419, 0), x_dir=(0, 0, 1), z_dir=(-0.5344938035, -0.8451723931, 0))):
        with BuildLine():
            ThreePointArc((4, 2.8491199883), (3.9238795325, 2.4664365559), (3.7071067812, 2.1420132071))
            Line((3.7071067812, 2.1420132071), (4, 2.4349064259))
            Line((4, 2.4349064259), (4, 2.8491199883))
        make_face()
    extrude(amount=F6_T55_DEPTH)

    split(bisect_by=Plane(origin=(0.2631936405, 6.5257137352, 6.5310191124), x_dir=(0.9991876647, -0.0402990155, 0), z_dir=(-0.0284957071, -0.7065323734, -0.7071067812)), keep=Keep.TOP)


with BuildPart() as f6_tool57:
    # F6_s58 → F6_t59 (new body)
    with BuildSketch(Plane(origin=(9.0674940614, -0.3657081614, 0), x_dir=(0, 0, 1), z_dir=(-0.9991876647, 0.0402990155, 0))):
        with BuildLine():
            ThreePointArc((4, 8.6478246624), (3.9238795325, 9.0305080948), (3.7071067812, 9.3549314436))
            Line((3.7071067812, 9.3549314436), (4, 9.0620382248))
            Line((4, 9.0620382248), (4, 8.6478246624))
        make_face()
    extrude(amount=F6_T59_DEPTH)

    split(bisect_by=Plane(origin=(0.6613869407, -0.4182664087, 0.7825467871), x_dir=(-0.5344938035, -0.8451723931, 0), z_dir=(-0.5976271304, 0.377944193, -0.7071067812)), keep=Keep.TOP)


with BuildPart() as f6_tool53_1:
    add(f6_tool53.part)

    # F6_t61: intersect F6_tool57
    add(f6_tool57.part, mode=Mode.INTERSECT)


with BuildPart() as f3_17:
    add(f3_16.part)

    # F6_t51: cut F6_tool53
    add(f6_tool53_1.part, mode=Mode.SUBTRACT)


with BuildPart() as f6_tool64:
    # F6_s65 → F6_t66 (new body)
    with BuildSketch(Plane(origin=(-2.7437856705, -2.7992212842, 0), x_dir=(0, 0, 1), z_dir=(0.7, 0.7141428429, 0))):
        with BuildLine():
            ThreePointArc((4, -2.0849863576), (3.9238795325, -2.46766979), (3.7071067812, -2.7920931388))
            Line((3.7071067812, -2.7920931388), (4, -2.49919992))
            Line((4, -2.49919992), (4, -2.0849863576))
        make_face()
    extrude(amount=F6_T66_DEPTH)

    split(bisect_by=Plane(origin=(0.0206083084, 1.6062040743, -1.6063362757), x_dir=(-0.9999177, 0.0128293861, 0), z_dir=(0.0090717459, 0.7070485863, -0.7071067812)), keep=Keep.TOP)


with BuildPart() as f6_tool68:
    # F6_s69 → F6_t70 (new body)
    with BuildSketch(Plane(origin=(1.3596181679, -0.0174445022, 0), x_dir=(0, 0, 1), z_dir=(0.9999177, -0.0128293861, 0))):
        with BuildLine():
            ThreePointArc((4, -7.6268861138), (3.9238795325, -7.2442026814), (3.7071067812, -6.9197793326))
            Line((3.7071067812, -6.9197793326), (4, -7.2126725514))
            Line((4, -7.2126725514), (4, -7.6268861138))
        make_face()
    extrude(amount=F6_T70_DEPTH)

    split(bisect_by=Plane(origin=(-2.3206785536, 2.274719972, 3.24959996), x_dir=(0.7, 0.7141428429, 0), z_dir=(0.5049752469, -0.4949747468, -0.7071067812)), keep=Keep.TOP)


with BuildPart() as f6_tool64_1:
    add(f6_tool64.part)

    # F6_t72: intersect F6_tool68
    add(f6_tool68.part, mode=Mode.INTERSECT)


with BuildPart() as f3_18:
    add(f3_17.part)

    # F6_t62: cut F6_tool64
    add(f6_tool64_1.part, mode=Mode.SUBTRACT)


with BuildPart() as f6_tool75:
    # F6_s76 → F6_t77 (new body)
    with BuildSketch(Plane.YZ.offset(-5.2714032343)):
        with BuildLine():
            ThreePointArc((-1.2071067812, 3.7071067812), (-1.53153013, 3.9238795325), (-1.9142135624, 4))
            Line((-1.9142135624, 4), (-1.5, 4))
            Line((-1.5, 4), (-1.2071067812, 3.7071067812))
        make_face()
    extrude(amount=F6_T77_DEPTH)

    split(bisect_by=Plane(origin=(0.7866504888, -0.9714324518, 1.25), x_dir=(-0.7771459615, -0.629320391, 0), z_dir=(-0.4449967161, 0.5495251793, -0.7071067812)), keep=Keep.TOP)


with BuildPart() as f6_tool79:
    # F6_s80 → F6_t81 (new body)
    with BuildSketch(Plane(origin=(10.1467341546, 8.2166633075, 0), x_dir=(0, 0, 1), z_dir=(-0.7771459615, -0.629320391, 0))):
        with BuildLine():
            ThreePointArc((4, 1.9142135624), (3.9238795325, 1.53153013), (3.7071067812, 1.2071067812))
            Line((3.7071067812, 1.2071067812), (4, 1.5))
            Line((4, 1.5), (4, 1.9142135624))
        make_face()
    extrude(amount=F6_T81_DEPTH)

    split(bisect_by=Plane(origin=(0, 1.25, 1.25), x_dir=(1, 0, 0), z_dir=(0, -0.7071067812, -0.7071067812)), keep=Keep.TOP)


with BuildPart() as f6_tool75_1:
    add(f6_tool75.part)

    # F6_t83: intersect F6_tool79
    add(f6_tool79.part, mode=Mode.INTERSECT)


with BuildPart() as f3_19:
    add(f3_18.part)

    # F6_t73: cut F6_tool75
    add(f6_tool75_1.part, mode=Mode.SUBTRACT)


with BuildPart() as f6_tool86:
    # F6_s87 → F6_t88 (new body)
    with BuildSketch(Plane(origin=(-9.4126080245, -11.078707332, 0), x_dir=(0, 0, 1), z_dir=(0.6474769539, 0.7620850308, 0))):
        with BuildLine():
            ThreePointArc((4, 2.4142135624), (3.9238795325, 2.03153013), (3.7071067812, 1.7071067812))
            Line((3.7071067812, 1.7071067812), (4, 2))
            Line((4, 2), (4, 2.4142135624))
        make_face()
    extrude(amount=F6_T88_DEPTH)

    split(bisect_by=Plane(origin=(0, -4.1071428572, 4.1071428572), x_dir=(1, 0, 0), z_dir=(0, 0.7071067812, -0.7071067812)), keep=Keep.TOP)


with BuildPart() as f6_tool90:
    # F6_s91 → F6_t92 (new body)
    with BuildSketch(Plane.YZ.offset(-2.924414976)):
        with BuildLine():
            ThreePointArc((-3.8000721519, 4), (-4.1827555843, 3.9238795325), (-4.5071789331, 3.7071067812))
            Line((-4.5071789331, 3.7071067812), (-4.2142857143, 4))
            Line((-4.2142857143, 4), (-3.8000721519, 4))
        make_face()
    extrude(amount=F6_T92_DEPTH)

    split(bisect_by=Plane(origin=(-0.7620850308, 0.6474769539, 1), x_dir=(0.6474769539, 0.7620850308, 0), z_dir=(0.5388754931, -0.4578353448, -0.7071067812)), keep=Keep.TOP)


with BuildPart() as f6_tool86_1:
    add(f6_tool86.part)

    # F6_t94: intersect F6_tool90
    add(f6_tool90.part, mode=Mode.INTERSECT)


with BuildPart() as f3_20:
    add(f3_19.part)

    # F6_t84: cut F6_tool86
    add(f6_tool86_1.part, mode=Mode.SUBTRACT)


solid = Compound([f1_1.part, f1b_1.part, f3_20.part])
